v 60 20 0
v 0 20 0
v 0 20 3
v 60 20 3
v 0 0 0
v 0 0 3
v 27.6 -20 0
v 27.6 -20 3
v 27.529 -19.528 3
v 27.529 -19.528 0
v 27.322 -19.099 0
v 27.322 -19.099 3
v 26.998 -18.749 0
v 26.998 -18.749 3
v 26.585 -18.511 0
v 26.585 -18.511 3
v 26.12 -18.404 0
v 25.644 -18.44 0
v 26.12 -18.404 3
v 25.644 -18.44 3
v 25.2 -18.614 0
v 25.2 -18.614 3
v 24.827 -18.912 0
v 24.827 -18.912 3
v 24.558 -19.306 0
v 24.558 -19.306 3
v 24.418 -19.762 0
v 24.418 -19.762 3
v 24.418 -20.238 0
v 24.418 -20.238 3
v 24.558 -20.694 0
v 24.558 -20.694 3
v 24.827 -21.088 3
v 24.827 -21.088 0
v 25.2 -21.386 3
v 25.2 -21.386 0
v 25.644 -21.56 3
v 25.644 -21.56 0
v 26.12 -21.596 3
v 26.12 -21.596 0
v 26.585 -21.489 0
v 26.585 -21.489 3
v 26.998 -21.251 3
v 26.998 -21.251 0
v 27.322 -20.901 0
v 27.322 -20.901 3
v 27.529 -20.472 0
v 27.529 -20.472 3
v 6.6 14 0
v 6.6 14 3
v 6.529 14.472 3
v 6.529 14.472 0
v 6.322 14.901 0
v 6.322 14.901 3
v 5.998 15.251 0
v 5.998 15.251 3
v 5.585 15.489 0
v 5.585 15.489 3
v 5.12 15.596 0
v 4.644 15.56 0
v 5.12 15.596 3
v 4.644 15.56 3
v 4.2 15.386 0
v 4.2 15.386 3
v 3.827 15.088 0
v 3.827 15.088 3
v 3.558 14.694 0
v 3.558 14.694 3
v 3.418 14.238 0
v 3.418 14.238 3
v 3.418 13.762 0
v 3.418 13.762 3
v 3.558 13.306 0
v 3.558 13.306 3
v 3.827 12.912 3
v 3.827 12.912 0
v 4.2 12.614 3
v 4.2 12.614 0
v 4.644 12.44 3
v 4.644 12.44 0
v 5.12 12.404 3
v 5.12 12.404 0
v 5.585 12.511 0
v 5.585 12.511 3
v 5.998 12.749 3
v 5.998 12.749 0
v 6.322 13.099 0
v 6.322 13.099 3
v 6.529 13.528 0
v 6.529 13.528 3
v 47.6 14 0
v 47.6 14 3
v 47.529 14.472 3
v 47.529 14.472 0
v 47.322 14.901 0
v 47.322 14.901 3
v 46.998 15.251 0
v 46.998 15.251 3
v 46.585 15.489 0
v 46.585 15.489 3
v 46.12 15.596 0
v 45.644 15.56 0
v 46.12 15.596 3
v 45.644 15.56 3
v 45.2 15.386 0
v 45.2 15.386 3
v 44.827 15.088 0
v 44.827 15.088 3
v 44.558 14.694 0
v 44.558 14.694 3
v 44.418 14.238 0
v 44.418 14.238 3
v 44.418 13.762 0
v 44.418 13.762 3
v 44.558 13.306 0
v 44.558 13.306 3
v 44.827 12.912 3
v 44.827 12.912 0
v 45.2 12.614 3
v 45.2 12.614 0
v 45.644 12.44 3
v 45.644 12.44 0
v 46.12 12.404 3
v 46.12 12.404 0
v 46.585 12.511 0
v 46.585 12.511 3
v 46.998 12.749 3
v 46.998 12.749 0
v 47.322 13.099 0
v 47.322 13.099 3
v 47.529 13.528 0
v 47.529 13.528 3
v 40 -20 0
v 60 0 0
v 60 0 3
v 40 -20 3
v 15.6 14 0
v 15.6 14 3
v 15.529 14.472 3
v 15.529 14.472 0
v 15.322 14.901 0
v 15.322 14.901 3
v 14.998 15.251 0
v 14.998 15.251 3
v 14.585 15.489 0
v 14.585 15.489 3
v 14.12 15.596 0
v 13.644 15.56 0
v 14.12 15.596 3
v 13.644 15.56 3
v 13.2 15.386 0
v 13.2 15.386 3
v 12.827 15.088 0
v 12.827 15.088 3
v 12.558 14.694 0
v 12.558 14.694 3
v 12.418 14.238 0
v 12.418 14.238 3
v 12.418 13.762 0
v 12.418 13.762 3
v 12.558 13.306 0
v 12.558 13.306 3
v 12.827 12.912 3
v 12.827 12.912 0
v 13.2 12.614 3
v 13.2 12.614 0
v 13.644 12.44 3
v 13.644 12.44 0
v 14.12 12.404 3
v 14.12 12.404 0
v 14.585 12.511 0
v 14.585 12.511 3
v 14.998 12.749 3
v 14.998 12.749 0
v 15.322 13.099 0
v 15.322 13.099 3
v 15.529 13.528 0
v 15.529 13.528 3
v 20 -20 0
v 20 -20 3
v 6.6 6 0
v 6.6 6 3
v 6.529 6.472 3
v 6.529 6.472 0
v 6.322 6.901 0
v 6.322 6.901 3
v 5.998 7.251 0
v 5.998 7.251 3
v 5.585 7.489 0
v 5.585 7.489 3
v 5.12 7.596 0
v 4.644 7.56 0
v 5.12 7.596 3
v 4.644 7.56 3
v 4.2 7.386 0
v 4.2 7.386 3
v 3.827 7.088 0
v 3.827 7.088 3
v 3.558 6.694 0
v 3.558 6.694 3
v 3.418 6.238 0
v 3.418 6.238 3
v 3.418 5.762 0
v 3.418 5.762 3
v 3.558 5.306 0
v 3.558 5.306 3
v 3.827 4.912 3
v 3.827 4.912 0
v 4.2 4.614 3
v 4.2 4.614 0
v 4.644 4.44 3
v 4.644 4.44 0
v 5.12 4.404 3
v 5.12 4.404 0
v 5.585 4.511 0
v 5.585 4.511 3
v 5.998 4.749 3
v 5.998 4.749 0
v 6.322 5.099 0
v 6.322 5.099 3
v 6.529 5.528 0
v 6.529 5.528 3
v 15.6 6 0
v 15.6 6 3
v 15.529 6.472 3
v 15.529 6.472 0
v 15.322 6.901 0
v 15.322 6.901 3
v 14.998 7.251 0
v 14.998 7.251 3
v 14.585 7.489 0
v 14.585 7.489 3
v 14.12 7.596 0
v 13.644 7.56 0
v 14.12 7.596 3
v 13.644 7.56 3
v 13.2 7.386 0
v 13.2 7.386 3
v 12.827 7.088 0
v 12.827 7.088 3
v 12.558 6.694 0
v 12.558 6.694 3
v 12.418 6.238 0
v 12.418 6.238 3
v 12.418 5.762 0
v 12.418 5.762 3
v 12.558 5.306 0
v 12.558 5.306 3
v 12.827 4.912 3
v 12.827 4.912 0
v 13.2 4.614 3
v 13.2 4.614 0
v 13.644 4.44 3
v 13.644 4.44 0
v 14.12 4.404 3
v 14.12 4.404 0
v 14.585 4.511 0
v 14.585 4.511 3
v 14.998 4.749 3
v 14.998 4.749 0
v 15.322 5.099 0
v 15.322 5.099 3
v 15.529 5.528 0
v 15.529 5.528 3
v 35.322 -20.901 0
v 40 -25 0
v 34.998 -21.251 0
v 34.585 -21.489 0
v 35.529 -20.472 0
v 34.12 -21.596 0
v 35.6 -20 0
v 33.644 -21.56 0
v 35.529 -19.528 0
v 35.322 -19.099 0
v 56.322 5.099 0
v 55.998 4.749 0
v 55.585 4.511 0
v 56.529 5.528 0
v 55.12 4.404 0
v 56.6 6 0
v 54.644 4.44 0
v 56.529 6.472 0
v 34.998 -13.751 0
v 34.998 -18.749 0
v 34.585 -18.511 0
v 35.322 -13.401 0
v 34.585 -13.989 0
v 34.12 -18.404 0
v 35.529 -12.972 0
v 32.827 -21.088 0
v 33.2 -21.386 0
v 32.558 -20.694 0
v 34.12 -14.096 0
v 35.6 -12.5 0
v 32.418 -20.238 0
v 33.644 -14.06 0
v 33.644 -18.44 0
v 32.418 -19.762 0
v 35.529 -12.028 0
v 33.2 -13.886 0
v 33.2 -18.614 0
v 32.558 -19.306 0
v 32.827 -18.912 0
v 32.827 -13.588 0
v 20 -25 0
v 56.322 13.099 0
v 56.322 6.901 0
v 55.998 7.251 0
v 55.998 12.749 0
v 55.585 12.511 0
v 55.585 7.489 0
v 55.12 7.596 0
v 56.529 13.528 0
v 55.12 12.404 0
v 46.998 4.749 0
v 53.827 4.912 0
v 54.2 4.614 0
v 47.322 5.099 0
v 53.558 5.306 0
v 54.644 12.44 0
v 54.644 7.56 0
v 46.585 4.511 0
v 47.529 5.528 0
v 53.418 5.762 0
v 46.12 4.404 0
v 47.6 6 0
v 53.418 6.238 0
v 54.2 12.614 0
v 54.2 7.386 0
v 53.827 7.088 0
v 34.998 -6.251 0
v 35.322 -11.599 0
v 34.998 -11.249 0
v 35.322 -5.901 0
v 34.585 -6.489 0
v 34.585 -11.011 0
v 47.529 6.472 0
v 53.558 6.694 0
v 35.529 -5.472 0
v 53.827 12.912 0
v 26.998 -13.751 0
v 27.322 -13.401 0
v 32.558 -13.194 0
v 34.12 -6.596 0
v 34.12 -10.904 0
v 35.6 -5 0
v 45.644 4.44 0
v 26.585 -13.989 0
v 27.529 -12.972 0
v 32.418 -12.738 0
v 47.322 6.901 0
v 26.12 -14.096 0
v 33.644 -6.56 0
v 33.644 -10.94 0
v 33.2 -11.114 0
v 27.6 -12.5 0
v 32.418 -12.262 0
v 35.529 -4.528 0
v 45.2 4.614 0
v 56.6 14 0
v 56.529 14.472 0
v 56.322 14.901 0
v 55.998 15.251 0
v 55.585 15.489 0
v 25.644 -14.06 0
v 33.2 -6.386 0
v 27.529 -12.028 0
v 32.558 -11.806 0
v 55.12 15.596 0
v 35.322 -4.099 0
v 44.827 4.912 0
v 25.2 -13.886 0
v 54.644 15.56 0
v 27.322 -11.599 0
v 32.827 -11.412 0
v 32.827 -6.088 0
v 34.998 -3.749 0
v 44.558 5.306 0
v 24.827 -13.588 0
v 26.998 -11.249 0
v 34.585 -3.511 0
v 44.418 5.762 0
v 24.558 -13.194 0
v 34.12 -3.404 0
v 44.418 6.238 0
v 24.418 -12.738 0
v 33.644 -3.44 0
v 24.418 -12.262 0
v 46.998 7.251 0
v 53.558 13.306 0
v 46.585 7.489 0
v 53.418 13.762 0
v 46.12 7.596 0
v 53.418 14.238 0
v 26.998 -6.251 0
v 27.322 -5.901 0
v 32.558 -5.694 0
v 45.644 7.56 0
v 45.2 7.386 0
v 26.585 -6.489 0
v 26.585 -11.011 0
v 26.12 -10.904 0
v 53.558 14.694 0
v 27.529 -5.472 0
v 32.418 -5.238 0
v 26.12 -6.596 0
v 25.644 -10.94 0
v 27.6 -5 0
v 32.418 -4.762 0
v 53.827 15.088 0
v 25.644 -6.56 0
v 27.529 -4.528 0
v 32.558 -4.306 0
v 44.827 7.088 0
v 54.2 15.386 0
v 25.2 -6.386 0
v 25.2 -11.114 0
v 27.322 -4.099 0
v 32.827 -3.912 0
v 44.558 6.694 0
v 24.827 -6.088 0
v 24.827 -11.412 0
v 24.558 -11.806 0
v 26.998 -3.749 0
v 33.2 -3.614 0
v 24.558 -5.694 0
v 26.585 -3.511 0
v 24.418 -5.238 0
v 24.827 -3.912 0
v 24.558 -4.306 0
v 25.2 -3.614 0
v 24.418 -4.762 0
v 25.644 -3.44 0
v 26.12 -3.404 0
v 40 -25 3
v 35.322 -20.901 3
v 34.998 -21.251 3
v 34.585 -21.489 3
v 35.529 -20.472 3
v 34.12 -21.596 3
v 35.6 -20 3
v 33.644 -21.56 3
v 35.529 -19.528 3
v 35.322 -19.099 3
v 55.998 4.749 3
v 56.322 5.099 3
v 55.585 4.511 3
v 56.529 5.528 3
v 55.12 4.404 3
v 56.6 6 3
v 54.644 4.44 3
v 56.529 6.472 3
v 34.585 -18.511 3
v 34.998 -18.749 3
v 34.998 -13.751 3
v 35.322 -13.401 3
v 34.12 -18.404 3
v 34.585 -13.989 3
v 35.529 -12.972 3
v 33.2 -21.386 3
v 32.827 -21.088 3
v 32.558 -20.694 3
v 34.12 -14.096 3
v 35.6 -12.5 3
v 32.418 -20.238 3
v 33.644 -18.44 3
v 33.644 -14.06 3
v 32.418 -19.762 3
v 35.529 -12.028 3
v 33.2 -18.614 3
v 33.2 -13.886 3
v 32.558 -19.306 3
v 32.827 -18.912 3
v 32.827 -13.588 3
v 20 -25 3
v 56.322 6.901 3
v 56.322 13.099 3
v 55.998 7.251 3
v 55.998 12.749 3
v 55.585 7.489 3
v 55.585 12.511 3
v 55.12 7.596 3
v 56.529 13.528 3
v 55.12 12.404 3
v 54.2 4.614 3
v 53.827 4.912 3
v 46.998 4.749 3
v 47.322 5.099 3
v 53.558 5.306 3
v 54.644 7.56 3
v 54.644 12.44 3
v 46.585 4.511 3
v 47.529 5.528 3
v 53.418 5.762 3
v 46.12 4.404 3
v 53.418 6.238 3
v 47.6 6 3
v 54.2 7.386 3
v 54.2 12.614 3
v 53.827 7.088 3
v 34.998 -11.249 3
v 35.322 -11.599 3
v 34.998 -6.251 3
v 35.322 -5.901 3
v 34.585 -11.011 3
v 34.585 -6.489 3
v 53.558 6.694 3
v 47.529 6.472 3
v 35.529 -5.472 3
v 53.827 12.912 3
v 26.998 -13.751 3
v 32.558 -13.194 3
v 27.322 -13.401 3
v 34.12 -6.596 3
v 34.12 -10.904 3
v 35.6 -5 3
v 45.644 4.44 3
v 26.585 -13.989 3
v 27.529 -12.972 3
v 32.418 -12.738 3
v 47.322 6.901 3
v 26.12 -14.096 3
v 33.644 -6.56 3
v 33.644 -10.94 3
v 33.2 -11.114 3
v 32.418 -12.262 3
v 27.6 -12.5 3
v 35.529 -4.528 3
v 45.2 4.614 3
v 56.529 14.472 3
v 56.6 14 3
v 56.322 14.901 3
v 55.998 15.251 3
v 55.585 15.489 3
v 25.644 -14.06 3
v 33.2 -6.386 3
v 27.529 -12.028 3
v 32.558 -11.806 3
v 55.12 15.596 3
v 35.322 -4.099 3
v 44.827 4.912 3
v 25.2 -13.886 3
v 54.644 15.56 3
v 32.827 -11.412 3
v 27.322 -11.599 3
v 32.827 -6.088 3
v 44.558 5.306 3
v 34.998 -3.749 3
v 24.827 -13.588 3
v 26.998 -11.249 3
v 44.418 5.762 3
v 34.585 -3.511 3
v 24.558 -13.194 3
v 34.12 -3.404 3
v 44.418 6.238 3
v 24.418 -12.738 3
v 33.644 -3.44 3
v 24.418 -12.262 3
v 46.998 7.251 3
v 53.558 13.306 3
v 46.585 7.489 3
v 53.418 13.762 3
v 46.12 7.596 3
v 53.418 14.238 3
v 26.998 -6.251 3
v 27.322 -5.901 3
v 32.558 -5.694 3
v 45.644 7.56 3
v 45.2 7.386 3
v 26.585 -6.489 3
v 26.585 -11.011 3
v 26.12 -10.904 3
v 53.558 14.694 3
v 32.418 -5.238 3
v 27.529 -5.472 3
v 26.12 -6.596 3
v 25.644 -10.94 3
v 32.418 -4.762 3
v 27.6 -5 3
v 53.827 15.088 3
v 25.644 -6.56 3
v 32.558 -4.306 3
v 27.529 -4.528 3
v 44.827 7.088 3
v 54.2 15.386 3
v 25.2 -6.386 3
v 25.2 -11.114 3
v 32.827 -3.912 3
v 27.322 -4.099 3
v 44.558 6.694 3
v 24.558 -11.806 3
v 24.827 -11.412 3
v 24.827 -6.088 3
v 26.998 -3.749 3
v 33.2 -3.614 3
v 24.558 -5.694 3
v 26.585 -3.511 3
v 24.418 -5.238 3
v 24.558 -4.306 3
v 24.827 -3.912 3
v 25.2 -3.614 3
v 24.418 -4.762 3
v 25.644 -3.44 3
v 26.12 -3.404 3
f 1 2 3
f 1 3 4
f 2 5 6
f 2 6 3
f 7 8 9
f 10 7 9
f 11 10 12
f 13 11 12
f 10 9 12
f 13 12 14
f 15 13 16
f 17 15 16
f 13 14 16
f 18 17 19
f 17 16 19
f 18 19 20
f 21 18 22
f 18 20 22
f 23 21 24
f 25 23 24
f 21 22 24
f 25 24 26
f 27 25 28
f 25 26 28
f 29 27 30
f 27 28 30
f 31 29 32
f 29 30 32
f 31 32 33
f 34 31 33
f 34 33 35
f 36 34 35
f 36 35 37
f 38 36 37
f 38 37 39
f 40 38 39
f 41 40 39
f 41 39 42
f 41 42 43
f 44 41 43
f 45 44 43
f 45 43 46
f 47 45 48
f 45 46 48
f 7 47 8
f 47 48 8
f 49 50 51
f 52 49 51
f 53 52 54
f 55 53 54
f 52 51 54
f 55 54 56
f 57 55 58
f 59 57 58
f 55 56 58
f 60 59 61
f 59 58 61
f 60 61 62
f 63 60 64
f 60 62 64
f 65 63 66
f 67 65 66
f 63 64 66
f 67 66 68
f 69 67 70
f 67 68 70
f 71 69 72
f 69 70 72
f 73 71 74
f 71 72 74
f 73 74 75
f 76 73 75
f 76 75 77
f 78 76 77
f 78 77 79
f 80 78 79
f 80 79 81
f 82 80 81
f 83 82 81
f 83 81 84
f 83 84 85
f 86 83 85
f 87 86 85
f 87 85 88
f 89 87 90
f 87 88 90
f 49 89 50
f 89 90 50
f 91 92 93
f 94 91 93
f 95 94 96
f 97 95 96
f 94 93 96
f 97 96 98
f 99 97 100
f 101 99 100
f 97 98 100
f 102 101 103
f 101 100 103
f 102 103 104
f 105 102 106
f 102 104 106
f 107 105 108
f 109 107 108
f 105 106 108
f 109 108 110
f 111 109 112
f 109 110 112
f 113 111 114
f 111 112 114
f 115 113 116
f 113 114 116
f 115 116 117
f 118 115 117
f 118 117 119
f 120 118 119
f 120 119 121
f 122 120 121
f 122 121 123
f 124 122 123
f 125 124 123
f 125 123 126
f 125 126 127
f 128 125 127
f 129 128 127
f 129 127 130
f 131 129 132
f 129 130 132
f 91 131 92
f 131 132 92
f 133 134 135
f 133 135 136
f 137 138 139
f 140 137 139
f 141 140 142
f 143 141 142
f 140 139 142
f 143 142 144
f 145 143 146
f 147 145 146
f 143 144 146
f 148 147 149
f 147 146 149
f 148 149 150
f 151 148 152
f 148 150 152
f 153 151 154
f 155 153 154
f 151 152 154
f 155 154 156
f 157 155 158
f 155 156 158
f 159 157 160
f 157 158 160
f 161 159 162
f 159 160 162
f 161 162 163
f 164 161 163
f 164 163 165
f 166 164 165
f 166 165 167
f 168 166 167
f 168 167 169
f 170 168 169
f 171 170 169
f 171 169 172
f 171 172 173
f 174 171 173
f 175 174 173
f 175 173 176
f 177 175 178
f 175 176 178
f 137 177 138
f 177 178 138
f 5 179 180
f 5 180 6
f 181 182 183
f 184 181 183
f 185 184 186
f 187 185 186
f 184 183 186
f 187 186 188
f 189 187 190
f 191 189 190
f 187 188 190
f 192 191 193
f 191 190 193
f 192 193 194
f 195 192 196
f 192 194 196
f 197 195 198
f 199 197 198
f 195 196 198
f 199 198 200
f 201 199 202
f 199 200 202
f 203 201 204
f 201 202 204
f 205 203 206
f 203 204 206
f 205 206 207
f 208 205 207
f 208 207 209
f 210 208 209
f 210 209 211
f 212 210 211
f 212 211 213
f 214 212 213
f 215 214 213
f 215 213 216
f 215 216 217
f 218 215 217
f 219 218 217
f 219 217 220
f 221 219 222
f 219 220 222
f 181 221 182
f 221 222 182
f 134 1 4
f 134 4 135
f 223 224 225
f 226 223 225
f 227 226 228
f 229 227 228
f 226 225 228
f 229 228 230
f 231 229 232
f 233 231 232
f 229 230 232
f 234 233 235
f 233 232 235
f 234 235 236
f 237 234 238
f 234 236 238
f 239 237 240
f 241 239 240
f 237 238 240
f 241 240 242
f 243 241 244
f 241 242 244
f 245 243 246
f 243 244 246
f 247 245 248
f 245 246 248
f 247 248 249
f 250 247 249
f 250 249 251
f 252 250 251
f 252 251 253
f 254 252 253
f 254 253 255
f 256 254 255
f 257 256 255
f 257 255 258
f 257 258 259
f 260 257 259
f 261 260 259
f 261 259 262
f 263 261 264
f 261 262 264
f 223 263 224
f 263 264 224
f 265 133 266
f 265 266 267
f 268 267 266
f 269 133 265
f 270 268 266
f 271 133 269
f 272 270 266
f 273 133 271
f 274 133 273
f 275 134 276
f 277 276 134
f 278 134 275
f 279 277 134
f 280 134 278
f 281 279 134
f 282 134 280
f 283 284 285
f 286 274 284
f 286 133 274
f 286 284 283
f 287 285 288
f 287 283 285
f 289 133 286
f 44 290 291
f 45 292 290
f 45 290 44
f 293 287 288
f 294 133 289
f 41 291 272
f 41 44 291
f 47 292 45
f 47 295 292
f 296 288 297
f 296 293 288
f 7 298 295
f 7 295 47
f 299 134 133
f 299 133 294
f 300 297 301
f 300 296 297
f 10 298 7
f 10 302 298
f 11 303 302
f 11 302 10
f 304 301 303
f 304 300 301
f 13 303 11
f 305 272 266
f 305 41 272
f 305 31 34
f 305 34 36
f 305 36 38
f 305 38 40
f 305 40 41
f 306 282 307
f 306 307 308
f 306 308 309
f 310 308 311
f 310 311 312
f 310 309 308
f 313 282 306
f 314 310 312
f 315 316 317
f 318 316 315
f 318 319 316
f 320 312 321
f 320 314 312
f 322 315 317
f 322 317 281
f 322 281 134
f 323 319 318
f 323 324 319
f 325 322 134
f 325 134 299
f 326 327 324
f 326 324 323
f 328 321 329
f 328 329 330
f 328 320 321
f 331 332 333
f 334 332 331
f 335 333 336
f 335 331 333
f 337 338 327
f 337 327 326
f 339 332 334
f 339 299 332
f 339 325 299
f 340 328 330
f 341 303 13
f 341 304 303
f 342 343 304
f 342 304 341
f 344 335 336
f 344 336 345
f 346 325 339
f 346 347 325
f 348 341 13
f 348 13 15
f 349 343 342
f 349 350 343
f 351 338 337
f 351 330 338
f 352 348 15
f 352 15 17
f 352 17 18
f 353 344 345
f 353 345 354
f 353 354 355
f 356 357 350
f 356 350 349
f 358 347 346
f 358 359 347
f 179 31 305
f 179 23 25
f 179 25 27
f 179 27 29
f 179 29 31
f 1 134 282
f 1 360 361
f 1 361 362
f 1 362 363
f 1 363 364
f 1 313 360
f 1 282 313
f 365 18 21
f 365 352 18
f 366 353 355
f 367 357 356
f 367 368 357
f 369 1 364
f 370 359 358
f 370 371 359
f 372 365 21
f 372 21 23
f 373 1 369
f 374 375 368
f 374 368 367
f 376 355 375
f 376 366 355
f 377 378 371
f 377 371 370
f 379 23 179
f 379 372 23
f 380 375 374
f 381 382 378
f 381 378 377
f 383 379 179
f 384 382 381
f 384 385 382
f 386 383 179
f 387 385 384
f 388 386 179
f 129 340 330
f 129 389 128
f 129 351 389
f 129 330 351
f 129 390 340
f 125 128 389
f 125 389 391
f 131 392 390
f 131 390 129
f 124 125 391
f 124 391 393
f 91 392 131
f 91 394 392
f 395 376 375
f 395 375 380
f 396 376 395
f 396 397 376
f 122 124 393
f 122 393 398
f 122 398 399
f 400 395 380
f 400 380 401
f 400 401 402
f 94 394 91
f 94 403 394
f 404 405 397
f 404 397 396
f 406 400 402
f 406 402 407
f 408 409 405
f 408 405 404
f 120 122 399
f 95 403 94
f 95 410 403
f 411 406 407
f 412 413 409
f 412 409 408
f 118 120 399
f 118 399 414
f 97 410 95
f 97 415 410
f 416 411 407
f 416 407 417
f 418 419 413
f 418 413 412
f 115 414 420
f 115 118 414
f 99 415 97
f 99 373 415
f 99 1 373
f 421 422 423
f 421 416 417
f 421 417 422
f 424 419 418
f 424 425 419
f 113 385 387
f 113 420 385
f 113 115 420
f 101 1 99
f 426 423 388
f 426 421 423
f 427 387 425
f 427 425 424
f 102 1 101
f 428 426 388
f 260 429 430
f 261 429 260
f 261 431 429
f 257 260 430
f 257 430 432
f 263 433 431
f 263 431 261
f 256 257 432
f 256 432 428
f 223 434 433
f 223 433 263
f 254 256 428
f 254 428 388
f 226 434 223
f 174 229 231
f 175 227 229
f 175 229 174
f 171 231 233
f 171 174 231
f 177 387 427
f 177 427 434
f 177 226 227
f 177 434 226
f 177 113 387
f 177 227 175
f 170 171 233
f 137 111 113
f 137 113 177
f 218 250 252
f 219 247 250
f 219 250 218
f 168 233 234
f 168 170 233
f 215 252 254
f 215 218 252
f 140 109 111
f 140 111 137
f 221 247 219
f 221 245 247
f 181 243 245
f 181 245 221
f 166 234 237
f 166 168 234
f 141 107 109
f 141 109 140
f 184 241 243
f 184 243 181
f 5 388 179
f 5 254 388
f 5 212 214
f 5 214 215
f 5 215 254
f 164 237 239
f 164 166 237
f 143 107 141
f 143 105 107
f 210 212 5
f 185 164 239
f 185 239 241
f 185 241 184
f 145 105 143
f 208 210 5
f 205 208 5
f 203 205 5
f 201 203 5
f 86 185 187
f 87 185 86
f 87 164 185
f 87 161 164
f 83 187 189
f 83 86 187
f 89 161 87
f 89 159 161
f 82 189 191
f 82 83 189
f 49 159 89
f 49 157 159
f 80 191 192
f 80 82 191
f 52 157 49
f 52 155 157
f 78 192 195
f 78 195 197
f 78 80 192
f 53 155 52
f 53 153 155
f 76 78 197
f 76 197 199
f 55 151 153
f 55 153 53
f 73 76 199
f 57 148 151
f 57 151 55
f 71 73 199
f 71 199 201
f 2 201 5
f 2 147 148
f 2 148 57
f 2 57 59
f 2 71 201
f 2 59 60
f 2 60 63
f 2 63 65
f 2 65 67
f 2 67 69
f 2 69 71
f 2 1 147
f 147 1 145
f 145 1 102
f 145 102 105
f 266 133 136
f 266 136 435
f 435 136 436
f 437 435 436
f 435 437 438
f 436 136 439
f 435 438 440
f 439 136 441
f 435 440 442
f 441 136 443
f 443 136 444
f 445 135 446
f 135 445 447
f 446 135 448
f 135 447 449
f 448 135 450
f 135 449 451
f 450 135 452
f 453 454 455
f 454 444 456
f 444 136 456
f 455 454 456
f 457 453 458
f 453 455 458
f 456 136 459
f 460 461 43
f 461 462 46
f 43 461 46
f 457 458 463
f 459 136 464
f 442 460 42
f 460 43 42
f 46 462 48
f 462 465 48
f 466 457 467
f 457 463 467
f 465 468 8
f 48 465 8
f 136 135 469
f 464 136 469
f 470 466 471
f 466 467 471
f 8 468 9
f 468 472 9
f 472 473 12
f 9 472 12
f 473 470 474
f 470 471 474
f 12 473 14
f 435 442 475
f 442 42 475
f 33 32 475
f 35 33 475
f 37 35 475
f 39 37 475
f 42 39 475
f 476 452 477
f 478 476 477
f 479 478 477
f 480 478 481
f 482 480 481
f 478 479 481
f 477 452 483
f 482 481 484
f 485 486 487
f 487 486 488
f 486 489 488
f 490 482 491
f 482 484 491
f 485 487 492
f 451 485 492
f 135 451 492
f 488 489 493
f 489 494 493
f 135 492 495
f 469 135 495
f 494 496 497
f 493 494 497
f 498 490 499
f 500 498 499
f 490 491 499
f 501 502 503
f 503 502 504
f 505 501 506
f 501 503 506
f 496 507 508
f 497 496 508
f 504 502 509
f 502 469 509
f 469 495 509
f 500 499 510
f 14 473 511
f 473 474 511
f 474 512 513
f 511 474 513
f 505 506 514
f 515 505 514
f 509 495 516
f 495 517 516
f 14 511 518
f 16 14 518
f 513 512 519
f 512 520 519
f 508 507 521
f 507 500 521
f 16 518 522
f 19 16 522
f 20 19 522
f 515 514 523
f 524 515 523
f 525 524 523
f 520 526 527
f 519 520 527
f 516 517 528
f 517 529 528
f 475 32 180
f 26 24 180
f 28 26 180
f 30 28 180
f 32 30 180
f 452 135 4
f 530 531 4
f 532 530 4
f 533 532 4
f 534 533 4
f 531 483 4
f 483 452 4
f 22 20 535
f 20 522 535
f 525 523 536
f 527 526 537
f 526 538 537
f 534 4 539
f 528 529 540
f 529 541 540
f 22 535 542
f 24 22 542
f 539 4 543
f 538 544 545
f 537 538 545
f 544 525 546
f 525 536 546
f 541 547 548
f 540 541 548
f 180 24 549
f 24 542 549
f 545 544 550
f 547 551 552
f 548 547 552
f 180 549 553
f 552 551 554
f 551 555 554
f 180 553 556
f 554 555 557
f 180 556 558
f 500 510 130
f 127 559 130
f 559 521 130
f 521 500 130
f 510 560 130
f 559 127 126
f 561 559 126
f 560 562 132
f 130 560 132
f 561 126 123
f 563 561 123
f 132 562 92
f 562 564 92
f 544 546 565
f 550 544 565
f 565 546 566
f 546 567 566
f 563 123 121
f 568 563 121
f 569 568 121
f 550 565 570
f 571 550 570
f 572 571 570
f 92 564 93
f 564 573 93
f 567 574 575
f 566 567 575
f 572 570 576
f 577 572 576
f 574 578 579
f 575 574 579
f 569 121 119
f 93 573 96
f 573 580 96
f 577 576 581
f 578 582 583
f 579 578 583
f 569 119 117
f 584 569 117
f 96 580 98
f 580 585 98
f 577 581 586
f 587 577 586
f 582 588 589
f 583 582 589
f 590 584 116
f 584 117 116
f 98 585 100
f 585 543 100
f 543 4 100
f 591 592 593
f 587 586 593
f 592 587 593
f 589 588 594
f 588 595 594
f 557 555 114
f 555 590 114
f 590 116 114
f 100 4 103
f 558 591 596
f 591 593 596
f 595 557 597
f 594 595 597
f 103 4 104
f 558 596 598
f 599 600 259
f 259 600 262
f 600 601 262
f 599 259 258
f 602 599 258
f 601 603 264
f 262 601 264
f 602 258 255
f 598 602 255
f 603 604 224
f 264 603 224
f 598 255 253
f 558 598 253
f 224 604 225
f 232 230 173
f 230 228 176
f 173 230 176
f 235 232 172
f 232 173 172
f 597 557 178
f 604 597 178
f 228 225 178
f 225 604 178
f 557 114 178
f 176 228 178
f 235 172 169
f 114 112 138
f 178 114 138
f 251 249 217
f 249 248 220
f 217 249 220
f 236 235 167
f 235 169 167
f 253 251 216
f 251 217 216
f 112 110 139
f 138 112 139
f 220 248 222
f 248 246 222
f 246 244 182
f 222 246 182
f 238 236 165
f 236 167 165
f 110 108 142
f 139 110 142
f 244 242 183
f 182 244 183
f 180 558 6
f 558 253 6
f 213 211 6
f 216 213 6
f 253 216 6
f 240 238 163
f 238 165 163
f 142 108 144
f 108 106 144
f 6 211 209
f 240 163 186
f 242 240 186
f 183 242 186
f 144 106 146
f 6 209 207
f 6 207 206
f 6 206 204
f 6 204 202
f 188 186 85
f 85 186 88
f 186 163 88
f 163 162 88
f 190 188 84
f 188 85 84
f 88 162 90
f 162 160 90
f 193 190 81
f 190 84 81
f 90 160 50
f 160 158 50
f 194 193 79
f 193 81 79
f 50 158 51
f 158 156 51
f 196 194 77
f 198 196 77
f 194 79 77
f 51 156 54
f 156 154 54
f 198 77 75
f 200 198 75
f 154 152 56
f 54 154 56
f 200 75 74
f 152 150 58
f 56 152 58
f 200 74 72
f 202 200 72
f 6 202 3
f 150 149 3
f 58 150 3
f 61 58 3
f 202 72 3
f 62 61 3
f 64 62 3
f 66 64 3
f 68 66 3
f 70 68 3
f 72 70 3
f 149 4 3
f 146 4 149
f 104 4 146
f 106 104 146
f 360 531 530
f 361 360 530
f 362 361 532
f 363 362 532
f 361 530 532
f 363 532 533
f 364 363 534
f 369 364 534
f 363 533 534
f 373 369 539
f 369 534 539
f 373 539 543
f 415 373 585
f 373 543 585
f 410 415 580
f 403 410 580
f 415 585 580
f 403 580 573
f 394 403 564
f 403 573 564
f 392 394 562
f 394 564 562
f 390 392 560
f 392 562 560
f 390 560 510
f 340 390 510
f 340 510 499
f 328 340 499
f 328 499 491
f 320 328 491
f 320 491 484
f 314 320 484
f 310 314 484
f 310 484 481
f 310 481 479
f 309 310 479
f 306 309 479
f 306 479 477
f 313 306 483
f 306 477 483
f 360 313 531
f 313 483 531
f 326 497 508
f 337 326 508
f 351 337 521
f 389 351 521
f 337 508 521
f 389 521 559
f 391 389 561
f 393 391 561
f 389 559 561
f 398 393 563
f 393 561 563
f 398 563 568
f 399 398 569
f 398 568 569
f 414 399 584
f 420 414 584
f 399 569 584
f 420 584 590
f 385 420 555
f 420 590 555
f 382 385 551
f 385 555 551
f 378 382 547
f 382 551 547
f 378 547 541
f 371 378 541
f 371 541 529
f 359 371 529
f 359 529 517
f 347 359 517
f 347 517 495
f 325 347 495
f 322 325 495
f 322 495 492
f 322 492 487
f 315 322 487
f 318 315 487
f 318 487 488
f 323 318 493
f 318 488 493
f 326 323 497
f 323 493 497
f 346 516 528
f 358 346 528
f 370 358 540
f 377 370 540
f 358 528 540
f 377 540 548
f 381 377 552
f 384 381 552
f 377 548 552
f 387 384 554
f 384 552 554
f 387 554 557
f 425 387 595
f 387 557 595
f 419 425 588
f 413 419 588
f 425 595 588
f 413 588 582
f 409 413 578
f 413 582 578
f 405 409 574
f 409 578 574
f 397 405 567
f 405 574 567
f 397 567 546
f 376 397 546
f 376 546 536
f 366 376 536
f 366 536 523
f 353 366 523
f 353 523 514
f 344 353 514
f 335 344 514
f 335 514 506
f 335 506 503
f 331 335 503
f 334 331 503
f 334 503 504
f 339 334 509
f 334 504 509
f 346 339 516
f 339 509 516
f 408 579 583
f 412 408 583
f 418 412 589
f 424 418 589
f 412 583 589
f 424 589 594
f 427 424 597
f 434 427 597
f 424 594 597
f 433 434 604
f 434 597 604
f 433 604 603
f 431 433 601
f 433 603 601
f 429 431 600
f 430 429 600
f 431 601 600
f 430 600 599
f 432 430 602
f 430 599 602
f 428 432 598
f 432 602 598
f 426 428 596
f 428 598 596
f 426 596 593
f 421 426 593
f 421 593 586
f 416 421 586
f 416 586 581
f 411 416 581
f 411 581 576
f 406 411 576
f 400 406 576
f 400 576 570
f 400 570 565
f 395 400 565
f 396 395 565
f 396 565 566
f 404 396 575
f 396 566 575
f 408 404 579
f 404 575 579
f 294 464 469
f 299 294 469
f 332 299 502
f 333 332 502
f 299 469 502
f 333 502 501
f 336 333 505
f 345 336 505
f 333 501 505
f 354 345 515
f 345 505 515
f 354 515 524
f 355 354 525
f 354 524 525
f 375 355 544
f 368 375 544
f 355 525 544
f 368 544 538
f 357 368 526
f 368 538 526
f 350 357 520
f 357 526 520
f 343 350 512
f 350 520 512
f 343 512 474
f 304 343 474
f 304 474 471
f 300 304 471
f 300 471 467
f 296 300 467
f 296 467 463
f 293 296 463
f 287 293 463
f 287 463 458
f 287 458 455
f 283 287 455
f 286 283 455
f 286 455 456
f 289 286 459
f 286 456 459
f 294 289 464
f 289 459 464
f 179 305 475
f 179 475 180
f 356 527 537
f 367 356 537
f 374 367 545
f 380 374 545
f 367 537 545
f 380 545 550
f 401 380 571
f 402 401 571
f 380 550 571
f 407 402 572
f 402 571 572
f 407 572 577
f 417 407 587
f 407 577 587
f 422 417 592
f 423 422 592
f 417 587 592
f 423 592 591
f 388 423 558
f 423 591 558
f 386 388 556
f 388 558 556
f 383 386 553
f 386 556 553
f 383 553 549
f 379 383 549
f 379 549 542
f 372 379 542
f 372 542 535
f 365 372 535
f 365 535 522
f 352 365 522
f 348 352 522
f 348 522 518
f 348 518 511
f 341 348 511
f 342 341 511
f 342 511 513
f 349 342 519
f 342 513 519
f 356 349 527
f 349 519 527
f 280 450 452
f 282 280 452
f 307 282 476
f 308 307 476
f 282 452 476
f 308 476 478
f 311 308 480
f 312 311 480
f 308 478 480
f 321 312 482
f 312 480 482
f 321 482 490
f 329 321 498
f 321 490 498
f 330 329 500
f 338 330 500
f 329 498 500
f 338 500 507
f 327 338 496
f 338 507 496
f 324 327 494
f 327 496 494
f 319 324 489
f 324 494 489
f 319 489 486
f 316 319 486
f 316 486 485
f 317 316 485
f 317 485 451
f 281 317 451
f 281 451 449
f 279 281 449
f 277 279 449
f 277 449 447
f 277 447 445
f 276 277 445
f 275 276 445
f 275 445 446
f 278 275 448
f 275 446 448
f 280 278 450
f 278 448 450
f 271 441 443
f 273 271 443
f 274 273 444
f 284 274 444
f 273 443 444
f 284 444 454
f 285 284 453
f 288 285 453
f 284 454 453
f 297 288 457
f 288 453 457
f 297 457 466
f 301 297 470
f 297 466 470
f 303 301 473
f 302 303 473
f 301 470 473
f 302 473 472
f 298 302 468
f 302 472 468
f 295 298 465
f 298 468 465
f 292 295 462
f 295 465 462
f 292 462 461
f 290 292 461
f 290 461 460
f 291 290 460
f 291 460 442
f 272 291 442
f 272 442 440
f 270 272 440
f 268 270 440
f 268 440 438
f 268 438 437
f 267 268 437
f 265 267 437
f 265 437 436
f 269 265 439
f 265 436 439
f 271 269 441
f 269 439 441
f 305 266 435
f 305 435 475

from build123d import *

# Parameters (mm, degrees)
EXTRUDE_1_DEPTH     = 3
SKETCH_3_R          = 1.6
CUT_EXTRUDE_1_DEPTH = 3


with BuildPart() as part:
    # 草图1 → 凸台-拉伸1 (new body)
    with BuildSketch(Plane.XY):
        Polygon((0, 0), (0, 20), (60, 20), (60, 0), (40, -20), (40, -25), (20, -25), (20, -20), align=None)
    extrude(amount=EXTRUDE_1_DEPTH)

    # 草图3 → 切除-拉伸1 (cut)
    with BuildSketch(Plane.XY.offset(3)):
        with Locations((26, -5)):
            Circle(SKETCH_3_R)
        with Locations((34, -5)):
            Circle(SKETCH_3_R)
        with Locations((26, -20)):
            Circle(SKETCH_3_R)
        with Locations((34, -20)):
            Circle(SKETCH_3_R)
        with Locations((26, -12.5)):
            Circle(SKETCH_3_R)
        with Locations((34, -12.5)):
            Circle(SKETCH_3_R)
        with Locations((5, 14)):
            Circle(SKETCH_3_R)
        with Locations((5, 6)):
            Circle(SKETCH_3_R)
        with Locations((14, 14)):
            Circle(SKETCH_3_R)
        with Locations((14, 6)):
            Circle(SKETCH_3_R)
        with Locations((55, 14)):
            Circle(SKETCH_3_R)
        with Locations((55, 6)):
            Circle(SKETCH_3_R)
        with Locations((46, 14)):
            Circle(SKETCH_3_R)
        with Locations((46, 6)):
            Circle(SKETCH_3_R)
    extrude(amount=-CUT_EXTRUDE_1_DEPTH, mode=Mode.SUBTRACT)


solid = part.part
